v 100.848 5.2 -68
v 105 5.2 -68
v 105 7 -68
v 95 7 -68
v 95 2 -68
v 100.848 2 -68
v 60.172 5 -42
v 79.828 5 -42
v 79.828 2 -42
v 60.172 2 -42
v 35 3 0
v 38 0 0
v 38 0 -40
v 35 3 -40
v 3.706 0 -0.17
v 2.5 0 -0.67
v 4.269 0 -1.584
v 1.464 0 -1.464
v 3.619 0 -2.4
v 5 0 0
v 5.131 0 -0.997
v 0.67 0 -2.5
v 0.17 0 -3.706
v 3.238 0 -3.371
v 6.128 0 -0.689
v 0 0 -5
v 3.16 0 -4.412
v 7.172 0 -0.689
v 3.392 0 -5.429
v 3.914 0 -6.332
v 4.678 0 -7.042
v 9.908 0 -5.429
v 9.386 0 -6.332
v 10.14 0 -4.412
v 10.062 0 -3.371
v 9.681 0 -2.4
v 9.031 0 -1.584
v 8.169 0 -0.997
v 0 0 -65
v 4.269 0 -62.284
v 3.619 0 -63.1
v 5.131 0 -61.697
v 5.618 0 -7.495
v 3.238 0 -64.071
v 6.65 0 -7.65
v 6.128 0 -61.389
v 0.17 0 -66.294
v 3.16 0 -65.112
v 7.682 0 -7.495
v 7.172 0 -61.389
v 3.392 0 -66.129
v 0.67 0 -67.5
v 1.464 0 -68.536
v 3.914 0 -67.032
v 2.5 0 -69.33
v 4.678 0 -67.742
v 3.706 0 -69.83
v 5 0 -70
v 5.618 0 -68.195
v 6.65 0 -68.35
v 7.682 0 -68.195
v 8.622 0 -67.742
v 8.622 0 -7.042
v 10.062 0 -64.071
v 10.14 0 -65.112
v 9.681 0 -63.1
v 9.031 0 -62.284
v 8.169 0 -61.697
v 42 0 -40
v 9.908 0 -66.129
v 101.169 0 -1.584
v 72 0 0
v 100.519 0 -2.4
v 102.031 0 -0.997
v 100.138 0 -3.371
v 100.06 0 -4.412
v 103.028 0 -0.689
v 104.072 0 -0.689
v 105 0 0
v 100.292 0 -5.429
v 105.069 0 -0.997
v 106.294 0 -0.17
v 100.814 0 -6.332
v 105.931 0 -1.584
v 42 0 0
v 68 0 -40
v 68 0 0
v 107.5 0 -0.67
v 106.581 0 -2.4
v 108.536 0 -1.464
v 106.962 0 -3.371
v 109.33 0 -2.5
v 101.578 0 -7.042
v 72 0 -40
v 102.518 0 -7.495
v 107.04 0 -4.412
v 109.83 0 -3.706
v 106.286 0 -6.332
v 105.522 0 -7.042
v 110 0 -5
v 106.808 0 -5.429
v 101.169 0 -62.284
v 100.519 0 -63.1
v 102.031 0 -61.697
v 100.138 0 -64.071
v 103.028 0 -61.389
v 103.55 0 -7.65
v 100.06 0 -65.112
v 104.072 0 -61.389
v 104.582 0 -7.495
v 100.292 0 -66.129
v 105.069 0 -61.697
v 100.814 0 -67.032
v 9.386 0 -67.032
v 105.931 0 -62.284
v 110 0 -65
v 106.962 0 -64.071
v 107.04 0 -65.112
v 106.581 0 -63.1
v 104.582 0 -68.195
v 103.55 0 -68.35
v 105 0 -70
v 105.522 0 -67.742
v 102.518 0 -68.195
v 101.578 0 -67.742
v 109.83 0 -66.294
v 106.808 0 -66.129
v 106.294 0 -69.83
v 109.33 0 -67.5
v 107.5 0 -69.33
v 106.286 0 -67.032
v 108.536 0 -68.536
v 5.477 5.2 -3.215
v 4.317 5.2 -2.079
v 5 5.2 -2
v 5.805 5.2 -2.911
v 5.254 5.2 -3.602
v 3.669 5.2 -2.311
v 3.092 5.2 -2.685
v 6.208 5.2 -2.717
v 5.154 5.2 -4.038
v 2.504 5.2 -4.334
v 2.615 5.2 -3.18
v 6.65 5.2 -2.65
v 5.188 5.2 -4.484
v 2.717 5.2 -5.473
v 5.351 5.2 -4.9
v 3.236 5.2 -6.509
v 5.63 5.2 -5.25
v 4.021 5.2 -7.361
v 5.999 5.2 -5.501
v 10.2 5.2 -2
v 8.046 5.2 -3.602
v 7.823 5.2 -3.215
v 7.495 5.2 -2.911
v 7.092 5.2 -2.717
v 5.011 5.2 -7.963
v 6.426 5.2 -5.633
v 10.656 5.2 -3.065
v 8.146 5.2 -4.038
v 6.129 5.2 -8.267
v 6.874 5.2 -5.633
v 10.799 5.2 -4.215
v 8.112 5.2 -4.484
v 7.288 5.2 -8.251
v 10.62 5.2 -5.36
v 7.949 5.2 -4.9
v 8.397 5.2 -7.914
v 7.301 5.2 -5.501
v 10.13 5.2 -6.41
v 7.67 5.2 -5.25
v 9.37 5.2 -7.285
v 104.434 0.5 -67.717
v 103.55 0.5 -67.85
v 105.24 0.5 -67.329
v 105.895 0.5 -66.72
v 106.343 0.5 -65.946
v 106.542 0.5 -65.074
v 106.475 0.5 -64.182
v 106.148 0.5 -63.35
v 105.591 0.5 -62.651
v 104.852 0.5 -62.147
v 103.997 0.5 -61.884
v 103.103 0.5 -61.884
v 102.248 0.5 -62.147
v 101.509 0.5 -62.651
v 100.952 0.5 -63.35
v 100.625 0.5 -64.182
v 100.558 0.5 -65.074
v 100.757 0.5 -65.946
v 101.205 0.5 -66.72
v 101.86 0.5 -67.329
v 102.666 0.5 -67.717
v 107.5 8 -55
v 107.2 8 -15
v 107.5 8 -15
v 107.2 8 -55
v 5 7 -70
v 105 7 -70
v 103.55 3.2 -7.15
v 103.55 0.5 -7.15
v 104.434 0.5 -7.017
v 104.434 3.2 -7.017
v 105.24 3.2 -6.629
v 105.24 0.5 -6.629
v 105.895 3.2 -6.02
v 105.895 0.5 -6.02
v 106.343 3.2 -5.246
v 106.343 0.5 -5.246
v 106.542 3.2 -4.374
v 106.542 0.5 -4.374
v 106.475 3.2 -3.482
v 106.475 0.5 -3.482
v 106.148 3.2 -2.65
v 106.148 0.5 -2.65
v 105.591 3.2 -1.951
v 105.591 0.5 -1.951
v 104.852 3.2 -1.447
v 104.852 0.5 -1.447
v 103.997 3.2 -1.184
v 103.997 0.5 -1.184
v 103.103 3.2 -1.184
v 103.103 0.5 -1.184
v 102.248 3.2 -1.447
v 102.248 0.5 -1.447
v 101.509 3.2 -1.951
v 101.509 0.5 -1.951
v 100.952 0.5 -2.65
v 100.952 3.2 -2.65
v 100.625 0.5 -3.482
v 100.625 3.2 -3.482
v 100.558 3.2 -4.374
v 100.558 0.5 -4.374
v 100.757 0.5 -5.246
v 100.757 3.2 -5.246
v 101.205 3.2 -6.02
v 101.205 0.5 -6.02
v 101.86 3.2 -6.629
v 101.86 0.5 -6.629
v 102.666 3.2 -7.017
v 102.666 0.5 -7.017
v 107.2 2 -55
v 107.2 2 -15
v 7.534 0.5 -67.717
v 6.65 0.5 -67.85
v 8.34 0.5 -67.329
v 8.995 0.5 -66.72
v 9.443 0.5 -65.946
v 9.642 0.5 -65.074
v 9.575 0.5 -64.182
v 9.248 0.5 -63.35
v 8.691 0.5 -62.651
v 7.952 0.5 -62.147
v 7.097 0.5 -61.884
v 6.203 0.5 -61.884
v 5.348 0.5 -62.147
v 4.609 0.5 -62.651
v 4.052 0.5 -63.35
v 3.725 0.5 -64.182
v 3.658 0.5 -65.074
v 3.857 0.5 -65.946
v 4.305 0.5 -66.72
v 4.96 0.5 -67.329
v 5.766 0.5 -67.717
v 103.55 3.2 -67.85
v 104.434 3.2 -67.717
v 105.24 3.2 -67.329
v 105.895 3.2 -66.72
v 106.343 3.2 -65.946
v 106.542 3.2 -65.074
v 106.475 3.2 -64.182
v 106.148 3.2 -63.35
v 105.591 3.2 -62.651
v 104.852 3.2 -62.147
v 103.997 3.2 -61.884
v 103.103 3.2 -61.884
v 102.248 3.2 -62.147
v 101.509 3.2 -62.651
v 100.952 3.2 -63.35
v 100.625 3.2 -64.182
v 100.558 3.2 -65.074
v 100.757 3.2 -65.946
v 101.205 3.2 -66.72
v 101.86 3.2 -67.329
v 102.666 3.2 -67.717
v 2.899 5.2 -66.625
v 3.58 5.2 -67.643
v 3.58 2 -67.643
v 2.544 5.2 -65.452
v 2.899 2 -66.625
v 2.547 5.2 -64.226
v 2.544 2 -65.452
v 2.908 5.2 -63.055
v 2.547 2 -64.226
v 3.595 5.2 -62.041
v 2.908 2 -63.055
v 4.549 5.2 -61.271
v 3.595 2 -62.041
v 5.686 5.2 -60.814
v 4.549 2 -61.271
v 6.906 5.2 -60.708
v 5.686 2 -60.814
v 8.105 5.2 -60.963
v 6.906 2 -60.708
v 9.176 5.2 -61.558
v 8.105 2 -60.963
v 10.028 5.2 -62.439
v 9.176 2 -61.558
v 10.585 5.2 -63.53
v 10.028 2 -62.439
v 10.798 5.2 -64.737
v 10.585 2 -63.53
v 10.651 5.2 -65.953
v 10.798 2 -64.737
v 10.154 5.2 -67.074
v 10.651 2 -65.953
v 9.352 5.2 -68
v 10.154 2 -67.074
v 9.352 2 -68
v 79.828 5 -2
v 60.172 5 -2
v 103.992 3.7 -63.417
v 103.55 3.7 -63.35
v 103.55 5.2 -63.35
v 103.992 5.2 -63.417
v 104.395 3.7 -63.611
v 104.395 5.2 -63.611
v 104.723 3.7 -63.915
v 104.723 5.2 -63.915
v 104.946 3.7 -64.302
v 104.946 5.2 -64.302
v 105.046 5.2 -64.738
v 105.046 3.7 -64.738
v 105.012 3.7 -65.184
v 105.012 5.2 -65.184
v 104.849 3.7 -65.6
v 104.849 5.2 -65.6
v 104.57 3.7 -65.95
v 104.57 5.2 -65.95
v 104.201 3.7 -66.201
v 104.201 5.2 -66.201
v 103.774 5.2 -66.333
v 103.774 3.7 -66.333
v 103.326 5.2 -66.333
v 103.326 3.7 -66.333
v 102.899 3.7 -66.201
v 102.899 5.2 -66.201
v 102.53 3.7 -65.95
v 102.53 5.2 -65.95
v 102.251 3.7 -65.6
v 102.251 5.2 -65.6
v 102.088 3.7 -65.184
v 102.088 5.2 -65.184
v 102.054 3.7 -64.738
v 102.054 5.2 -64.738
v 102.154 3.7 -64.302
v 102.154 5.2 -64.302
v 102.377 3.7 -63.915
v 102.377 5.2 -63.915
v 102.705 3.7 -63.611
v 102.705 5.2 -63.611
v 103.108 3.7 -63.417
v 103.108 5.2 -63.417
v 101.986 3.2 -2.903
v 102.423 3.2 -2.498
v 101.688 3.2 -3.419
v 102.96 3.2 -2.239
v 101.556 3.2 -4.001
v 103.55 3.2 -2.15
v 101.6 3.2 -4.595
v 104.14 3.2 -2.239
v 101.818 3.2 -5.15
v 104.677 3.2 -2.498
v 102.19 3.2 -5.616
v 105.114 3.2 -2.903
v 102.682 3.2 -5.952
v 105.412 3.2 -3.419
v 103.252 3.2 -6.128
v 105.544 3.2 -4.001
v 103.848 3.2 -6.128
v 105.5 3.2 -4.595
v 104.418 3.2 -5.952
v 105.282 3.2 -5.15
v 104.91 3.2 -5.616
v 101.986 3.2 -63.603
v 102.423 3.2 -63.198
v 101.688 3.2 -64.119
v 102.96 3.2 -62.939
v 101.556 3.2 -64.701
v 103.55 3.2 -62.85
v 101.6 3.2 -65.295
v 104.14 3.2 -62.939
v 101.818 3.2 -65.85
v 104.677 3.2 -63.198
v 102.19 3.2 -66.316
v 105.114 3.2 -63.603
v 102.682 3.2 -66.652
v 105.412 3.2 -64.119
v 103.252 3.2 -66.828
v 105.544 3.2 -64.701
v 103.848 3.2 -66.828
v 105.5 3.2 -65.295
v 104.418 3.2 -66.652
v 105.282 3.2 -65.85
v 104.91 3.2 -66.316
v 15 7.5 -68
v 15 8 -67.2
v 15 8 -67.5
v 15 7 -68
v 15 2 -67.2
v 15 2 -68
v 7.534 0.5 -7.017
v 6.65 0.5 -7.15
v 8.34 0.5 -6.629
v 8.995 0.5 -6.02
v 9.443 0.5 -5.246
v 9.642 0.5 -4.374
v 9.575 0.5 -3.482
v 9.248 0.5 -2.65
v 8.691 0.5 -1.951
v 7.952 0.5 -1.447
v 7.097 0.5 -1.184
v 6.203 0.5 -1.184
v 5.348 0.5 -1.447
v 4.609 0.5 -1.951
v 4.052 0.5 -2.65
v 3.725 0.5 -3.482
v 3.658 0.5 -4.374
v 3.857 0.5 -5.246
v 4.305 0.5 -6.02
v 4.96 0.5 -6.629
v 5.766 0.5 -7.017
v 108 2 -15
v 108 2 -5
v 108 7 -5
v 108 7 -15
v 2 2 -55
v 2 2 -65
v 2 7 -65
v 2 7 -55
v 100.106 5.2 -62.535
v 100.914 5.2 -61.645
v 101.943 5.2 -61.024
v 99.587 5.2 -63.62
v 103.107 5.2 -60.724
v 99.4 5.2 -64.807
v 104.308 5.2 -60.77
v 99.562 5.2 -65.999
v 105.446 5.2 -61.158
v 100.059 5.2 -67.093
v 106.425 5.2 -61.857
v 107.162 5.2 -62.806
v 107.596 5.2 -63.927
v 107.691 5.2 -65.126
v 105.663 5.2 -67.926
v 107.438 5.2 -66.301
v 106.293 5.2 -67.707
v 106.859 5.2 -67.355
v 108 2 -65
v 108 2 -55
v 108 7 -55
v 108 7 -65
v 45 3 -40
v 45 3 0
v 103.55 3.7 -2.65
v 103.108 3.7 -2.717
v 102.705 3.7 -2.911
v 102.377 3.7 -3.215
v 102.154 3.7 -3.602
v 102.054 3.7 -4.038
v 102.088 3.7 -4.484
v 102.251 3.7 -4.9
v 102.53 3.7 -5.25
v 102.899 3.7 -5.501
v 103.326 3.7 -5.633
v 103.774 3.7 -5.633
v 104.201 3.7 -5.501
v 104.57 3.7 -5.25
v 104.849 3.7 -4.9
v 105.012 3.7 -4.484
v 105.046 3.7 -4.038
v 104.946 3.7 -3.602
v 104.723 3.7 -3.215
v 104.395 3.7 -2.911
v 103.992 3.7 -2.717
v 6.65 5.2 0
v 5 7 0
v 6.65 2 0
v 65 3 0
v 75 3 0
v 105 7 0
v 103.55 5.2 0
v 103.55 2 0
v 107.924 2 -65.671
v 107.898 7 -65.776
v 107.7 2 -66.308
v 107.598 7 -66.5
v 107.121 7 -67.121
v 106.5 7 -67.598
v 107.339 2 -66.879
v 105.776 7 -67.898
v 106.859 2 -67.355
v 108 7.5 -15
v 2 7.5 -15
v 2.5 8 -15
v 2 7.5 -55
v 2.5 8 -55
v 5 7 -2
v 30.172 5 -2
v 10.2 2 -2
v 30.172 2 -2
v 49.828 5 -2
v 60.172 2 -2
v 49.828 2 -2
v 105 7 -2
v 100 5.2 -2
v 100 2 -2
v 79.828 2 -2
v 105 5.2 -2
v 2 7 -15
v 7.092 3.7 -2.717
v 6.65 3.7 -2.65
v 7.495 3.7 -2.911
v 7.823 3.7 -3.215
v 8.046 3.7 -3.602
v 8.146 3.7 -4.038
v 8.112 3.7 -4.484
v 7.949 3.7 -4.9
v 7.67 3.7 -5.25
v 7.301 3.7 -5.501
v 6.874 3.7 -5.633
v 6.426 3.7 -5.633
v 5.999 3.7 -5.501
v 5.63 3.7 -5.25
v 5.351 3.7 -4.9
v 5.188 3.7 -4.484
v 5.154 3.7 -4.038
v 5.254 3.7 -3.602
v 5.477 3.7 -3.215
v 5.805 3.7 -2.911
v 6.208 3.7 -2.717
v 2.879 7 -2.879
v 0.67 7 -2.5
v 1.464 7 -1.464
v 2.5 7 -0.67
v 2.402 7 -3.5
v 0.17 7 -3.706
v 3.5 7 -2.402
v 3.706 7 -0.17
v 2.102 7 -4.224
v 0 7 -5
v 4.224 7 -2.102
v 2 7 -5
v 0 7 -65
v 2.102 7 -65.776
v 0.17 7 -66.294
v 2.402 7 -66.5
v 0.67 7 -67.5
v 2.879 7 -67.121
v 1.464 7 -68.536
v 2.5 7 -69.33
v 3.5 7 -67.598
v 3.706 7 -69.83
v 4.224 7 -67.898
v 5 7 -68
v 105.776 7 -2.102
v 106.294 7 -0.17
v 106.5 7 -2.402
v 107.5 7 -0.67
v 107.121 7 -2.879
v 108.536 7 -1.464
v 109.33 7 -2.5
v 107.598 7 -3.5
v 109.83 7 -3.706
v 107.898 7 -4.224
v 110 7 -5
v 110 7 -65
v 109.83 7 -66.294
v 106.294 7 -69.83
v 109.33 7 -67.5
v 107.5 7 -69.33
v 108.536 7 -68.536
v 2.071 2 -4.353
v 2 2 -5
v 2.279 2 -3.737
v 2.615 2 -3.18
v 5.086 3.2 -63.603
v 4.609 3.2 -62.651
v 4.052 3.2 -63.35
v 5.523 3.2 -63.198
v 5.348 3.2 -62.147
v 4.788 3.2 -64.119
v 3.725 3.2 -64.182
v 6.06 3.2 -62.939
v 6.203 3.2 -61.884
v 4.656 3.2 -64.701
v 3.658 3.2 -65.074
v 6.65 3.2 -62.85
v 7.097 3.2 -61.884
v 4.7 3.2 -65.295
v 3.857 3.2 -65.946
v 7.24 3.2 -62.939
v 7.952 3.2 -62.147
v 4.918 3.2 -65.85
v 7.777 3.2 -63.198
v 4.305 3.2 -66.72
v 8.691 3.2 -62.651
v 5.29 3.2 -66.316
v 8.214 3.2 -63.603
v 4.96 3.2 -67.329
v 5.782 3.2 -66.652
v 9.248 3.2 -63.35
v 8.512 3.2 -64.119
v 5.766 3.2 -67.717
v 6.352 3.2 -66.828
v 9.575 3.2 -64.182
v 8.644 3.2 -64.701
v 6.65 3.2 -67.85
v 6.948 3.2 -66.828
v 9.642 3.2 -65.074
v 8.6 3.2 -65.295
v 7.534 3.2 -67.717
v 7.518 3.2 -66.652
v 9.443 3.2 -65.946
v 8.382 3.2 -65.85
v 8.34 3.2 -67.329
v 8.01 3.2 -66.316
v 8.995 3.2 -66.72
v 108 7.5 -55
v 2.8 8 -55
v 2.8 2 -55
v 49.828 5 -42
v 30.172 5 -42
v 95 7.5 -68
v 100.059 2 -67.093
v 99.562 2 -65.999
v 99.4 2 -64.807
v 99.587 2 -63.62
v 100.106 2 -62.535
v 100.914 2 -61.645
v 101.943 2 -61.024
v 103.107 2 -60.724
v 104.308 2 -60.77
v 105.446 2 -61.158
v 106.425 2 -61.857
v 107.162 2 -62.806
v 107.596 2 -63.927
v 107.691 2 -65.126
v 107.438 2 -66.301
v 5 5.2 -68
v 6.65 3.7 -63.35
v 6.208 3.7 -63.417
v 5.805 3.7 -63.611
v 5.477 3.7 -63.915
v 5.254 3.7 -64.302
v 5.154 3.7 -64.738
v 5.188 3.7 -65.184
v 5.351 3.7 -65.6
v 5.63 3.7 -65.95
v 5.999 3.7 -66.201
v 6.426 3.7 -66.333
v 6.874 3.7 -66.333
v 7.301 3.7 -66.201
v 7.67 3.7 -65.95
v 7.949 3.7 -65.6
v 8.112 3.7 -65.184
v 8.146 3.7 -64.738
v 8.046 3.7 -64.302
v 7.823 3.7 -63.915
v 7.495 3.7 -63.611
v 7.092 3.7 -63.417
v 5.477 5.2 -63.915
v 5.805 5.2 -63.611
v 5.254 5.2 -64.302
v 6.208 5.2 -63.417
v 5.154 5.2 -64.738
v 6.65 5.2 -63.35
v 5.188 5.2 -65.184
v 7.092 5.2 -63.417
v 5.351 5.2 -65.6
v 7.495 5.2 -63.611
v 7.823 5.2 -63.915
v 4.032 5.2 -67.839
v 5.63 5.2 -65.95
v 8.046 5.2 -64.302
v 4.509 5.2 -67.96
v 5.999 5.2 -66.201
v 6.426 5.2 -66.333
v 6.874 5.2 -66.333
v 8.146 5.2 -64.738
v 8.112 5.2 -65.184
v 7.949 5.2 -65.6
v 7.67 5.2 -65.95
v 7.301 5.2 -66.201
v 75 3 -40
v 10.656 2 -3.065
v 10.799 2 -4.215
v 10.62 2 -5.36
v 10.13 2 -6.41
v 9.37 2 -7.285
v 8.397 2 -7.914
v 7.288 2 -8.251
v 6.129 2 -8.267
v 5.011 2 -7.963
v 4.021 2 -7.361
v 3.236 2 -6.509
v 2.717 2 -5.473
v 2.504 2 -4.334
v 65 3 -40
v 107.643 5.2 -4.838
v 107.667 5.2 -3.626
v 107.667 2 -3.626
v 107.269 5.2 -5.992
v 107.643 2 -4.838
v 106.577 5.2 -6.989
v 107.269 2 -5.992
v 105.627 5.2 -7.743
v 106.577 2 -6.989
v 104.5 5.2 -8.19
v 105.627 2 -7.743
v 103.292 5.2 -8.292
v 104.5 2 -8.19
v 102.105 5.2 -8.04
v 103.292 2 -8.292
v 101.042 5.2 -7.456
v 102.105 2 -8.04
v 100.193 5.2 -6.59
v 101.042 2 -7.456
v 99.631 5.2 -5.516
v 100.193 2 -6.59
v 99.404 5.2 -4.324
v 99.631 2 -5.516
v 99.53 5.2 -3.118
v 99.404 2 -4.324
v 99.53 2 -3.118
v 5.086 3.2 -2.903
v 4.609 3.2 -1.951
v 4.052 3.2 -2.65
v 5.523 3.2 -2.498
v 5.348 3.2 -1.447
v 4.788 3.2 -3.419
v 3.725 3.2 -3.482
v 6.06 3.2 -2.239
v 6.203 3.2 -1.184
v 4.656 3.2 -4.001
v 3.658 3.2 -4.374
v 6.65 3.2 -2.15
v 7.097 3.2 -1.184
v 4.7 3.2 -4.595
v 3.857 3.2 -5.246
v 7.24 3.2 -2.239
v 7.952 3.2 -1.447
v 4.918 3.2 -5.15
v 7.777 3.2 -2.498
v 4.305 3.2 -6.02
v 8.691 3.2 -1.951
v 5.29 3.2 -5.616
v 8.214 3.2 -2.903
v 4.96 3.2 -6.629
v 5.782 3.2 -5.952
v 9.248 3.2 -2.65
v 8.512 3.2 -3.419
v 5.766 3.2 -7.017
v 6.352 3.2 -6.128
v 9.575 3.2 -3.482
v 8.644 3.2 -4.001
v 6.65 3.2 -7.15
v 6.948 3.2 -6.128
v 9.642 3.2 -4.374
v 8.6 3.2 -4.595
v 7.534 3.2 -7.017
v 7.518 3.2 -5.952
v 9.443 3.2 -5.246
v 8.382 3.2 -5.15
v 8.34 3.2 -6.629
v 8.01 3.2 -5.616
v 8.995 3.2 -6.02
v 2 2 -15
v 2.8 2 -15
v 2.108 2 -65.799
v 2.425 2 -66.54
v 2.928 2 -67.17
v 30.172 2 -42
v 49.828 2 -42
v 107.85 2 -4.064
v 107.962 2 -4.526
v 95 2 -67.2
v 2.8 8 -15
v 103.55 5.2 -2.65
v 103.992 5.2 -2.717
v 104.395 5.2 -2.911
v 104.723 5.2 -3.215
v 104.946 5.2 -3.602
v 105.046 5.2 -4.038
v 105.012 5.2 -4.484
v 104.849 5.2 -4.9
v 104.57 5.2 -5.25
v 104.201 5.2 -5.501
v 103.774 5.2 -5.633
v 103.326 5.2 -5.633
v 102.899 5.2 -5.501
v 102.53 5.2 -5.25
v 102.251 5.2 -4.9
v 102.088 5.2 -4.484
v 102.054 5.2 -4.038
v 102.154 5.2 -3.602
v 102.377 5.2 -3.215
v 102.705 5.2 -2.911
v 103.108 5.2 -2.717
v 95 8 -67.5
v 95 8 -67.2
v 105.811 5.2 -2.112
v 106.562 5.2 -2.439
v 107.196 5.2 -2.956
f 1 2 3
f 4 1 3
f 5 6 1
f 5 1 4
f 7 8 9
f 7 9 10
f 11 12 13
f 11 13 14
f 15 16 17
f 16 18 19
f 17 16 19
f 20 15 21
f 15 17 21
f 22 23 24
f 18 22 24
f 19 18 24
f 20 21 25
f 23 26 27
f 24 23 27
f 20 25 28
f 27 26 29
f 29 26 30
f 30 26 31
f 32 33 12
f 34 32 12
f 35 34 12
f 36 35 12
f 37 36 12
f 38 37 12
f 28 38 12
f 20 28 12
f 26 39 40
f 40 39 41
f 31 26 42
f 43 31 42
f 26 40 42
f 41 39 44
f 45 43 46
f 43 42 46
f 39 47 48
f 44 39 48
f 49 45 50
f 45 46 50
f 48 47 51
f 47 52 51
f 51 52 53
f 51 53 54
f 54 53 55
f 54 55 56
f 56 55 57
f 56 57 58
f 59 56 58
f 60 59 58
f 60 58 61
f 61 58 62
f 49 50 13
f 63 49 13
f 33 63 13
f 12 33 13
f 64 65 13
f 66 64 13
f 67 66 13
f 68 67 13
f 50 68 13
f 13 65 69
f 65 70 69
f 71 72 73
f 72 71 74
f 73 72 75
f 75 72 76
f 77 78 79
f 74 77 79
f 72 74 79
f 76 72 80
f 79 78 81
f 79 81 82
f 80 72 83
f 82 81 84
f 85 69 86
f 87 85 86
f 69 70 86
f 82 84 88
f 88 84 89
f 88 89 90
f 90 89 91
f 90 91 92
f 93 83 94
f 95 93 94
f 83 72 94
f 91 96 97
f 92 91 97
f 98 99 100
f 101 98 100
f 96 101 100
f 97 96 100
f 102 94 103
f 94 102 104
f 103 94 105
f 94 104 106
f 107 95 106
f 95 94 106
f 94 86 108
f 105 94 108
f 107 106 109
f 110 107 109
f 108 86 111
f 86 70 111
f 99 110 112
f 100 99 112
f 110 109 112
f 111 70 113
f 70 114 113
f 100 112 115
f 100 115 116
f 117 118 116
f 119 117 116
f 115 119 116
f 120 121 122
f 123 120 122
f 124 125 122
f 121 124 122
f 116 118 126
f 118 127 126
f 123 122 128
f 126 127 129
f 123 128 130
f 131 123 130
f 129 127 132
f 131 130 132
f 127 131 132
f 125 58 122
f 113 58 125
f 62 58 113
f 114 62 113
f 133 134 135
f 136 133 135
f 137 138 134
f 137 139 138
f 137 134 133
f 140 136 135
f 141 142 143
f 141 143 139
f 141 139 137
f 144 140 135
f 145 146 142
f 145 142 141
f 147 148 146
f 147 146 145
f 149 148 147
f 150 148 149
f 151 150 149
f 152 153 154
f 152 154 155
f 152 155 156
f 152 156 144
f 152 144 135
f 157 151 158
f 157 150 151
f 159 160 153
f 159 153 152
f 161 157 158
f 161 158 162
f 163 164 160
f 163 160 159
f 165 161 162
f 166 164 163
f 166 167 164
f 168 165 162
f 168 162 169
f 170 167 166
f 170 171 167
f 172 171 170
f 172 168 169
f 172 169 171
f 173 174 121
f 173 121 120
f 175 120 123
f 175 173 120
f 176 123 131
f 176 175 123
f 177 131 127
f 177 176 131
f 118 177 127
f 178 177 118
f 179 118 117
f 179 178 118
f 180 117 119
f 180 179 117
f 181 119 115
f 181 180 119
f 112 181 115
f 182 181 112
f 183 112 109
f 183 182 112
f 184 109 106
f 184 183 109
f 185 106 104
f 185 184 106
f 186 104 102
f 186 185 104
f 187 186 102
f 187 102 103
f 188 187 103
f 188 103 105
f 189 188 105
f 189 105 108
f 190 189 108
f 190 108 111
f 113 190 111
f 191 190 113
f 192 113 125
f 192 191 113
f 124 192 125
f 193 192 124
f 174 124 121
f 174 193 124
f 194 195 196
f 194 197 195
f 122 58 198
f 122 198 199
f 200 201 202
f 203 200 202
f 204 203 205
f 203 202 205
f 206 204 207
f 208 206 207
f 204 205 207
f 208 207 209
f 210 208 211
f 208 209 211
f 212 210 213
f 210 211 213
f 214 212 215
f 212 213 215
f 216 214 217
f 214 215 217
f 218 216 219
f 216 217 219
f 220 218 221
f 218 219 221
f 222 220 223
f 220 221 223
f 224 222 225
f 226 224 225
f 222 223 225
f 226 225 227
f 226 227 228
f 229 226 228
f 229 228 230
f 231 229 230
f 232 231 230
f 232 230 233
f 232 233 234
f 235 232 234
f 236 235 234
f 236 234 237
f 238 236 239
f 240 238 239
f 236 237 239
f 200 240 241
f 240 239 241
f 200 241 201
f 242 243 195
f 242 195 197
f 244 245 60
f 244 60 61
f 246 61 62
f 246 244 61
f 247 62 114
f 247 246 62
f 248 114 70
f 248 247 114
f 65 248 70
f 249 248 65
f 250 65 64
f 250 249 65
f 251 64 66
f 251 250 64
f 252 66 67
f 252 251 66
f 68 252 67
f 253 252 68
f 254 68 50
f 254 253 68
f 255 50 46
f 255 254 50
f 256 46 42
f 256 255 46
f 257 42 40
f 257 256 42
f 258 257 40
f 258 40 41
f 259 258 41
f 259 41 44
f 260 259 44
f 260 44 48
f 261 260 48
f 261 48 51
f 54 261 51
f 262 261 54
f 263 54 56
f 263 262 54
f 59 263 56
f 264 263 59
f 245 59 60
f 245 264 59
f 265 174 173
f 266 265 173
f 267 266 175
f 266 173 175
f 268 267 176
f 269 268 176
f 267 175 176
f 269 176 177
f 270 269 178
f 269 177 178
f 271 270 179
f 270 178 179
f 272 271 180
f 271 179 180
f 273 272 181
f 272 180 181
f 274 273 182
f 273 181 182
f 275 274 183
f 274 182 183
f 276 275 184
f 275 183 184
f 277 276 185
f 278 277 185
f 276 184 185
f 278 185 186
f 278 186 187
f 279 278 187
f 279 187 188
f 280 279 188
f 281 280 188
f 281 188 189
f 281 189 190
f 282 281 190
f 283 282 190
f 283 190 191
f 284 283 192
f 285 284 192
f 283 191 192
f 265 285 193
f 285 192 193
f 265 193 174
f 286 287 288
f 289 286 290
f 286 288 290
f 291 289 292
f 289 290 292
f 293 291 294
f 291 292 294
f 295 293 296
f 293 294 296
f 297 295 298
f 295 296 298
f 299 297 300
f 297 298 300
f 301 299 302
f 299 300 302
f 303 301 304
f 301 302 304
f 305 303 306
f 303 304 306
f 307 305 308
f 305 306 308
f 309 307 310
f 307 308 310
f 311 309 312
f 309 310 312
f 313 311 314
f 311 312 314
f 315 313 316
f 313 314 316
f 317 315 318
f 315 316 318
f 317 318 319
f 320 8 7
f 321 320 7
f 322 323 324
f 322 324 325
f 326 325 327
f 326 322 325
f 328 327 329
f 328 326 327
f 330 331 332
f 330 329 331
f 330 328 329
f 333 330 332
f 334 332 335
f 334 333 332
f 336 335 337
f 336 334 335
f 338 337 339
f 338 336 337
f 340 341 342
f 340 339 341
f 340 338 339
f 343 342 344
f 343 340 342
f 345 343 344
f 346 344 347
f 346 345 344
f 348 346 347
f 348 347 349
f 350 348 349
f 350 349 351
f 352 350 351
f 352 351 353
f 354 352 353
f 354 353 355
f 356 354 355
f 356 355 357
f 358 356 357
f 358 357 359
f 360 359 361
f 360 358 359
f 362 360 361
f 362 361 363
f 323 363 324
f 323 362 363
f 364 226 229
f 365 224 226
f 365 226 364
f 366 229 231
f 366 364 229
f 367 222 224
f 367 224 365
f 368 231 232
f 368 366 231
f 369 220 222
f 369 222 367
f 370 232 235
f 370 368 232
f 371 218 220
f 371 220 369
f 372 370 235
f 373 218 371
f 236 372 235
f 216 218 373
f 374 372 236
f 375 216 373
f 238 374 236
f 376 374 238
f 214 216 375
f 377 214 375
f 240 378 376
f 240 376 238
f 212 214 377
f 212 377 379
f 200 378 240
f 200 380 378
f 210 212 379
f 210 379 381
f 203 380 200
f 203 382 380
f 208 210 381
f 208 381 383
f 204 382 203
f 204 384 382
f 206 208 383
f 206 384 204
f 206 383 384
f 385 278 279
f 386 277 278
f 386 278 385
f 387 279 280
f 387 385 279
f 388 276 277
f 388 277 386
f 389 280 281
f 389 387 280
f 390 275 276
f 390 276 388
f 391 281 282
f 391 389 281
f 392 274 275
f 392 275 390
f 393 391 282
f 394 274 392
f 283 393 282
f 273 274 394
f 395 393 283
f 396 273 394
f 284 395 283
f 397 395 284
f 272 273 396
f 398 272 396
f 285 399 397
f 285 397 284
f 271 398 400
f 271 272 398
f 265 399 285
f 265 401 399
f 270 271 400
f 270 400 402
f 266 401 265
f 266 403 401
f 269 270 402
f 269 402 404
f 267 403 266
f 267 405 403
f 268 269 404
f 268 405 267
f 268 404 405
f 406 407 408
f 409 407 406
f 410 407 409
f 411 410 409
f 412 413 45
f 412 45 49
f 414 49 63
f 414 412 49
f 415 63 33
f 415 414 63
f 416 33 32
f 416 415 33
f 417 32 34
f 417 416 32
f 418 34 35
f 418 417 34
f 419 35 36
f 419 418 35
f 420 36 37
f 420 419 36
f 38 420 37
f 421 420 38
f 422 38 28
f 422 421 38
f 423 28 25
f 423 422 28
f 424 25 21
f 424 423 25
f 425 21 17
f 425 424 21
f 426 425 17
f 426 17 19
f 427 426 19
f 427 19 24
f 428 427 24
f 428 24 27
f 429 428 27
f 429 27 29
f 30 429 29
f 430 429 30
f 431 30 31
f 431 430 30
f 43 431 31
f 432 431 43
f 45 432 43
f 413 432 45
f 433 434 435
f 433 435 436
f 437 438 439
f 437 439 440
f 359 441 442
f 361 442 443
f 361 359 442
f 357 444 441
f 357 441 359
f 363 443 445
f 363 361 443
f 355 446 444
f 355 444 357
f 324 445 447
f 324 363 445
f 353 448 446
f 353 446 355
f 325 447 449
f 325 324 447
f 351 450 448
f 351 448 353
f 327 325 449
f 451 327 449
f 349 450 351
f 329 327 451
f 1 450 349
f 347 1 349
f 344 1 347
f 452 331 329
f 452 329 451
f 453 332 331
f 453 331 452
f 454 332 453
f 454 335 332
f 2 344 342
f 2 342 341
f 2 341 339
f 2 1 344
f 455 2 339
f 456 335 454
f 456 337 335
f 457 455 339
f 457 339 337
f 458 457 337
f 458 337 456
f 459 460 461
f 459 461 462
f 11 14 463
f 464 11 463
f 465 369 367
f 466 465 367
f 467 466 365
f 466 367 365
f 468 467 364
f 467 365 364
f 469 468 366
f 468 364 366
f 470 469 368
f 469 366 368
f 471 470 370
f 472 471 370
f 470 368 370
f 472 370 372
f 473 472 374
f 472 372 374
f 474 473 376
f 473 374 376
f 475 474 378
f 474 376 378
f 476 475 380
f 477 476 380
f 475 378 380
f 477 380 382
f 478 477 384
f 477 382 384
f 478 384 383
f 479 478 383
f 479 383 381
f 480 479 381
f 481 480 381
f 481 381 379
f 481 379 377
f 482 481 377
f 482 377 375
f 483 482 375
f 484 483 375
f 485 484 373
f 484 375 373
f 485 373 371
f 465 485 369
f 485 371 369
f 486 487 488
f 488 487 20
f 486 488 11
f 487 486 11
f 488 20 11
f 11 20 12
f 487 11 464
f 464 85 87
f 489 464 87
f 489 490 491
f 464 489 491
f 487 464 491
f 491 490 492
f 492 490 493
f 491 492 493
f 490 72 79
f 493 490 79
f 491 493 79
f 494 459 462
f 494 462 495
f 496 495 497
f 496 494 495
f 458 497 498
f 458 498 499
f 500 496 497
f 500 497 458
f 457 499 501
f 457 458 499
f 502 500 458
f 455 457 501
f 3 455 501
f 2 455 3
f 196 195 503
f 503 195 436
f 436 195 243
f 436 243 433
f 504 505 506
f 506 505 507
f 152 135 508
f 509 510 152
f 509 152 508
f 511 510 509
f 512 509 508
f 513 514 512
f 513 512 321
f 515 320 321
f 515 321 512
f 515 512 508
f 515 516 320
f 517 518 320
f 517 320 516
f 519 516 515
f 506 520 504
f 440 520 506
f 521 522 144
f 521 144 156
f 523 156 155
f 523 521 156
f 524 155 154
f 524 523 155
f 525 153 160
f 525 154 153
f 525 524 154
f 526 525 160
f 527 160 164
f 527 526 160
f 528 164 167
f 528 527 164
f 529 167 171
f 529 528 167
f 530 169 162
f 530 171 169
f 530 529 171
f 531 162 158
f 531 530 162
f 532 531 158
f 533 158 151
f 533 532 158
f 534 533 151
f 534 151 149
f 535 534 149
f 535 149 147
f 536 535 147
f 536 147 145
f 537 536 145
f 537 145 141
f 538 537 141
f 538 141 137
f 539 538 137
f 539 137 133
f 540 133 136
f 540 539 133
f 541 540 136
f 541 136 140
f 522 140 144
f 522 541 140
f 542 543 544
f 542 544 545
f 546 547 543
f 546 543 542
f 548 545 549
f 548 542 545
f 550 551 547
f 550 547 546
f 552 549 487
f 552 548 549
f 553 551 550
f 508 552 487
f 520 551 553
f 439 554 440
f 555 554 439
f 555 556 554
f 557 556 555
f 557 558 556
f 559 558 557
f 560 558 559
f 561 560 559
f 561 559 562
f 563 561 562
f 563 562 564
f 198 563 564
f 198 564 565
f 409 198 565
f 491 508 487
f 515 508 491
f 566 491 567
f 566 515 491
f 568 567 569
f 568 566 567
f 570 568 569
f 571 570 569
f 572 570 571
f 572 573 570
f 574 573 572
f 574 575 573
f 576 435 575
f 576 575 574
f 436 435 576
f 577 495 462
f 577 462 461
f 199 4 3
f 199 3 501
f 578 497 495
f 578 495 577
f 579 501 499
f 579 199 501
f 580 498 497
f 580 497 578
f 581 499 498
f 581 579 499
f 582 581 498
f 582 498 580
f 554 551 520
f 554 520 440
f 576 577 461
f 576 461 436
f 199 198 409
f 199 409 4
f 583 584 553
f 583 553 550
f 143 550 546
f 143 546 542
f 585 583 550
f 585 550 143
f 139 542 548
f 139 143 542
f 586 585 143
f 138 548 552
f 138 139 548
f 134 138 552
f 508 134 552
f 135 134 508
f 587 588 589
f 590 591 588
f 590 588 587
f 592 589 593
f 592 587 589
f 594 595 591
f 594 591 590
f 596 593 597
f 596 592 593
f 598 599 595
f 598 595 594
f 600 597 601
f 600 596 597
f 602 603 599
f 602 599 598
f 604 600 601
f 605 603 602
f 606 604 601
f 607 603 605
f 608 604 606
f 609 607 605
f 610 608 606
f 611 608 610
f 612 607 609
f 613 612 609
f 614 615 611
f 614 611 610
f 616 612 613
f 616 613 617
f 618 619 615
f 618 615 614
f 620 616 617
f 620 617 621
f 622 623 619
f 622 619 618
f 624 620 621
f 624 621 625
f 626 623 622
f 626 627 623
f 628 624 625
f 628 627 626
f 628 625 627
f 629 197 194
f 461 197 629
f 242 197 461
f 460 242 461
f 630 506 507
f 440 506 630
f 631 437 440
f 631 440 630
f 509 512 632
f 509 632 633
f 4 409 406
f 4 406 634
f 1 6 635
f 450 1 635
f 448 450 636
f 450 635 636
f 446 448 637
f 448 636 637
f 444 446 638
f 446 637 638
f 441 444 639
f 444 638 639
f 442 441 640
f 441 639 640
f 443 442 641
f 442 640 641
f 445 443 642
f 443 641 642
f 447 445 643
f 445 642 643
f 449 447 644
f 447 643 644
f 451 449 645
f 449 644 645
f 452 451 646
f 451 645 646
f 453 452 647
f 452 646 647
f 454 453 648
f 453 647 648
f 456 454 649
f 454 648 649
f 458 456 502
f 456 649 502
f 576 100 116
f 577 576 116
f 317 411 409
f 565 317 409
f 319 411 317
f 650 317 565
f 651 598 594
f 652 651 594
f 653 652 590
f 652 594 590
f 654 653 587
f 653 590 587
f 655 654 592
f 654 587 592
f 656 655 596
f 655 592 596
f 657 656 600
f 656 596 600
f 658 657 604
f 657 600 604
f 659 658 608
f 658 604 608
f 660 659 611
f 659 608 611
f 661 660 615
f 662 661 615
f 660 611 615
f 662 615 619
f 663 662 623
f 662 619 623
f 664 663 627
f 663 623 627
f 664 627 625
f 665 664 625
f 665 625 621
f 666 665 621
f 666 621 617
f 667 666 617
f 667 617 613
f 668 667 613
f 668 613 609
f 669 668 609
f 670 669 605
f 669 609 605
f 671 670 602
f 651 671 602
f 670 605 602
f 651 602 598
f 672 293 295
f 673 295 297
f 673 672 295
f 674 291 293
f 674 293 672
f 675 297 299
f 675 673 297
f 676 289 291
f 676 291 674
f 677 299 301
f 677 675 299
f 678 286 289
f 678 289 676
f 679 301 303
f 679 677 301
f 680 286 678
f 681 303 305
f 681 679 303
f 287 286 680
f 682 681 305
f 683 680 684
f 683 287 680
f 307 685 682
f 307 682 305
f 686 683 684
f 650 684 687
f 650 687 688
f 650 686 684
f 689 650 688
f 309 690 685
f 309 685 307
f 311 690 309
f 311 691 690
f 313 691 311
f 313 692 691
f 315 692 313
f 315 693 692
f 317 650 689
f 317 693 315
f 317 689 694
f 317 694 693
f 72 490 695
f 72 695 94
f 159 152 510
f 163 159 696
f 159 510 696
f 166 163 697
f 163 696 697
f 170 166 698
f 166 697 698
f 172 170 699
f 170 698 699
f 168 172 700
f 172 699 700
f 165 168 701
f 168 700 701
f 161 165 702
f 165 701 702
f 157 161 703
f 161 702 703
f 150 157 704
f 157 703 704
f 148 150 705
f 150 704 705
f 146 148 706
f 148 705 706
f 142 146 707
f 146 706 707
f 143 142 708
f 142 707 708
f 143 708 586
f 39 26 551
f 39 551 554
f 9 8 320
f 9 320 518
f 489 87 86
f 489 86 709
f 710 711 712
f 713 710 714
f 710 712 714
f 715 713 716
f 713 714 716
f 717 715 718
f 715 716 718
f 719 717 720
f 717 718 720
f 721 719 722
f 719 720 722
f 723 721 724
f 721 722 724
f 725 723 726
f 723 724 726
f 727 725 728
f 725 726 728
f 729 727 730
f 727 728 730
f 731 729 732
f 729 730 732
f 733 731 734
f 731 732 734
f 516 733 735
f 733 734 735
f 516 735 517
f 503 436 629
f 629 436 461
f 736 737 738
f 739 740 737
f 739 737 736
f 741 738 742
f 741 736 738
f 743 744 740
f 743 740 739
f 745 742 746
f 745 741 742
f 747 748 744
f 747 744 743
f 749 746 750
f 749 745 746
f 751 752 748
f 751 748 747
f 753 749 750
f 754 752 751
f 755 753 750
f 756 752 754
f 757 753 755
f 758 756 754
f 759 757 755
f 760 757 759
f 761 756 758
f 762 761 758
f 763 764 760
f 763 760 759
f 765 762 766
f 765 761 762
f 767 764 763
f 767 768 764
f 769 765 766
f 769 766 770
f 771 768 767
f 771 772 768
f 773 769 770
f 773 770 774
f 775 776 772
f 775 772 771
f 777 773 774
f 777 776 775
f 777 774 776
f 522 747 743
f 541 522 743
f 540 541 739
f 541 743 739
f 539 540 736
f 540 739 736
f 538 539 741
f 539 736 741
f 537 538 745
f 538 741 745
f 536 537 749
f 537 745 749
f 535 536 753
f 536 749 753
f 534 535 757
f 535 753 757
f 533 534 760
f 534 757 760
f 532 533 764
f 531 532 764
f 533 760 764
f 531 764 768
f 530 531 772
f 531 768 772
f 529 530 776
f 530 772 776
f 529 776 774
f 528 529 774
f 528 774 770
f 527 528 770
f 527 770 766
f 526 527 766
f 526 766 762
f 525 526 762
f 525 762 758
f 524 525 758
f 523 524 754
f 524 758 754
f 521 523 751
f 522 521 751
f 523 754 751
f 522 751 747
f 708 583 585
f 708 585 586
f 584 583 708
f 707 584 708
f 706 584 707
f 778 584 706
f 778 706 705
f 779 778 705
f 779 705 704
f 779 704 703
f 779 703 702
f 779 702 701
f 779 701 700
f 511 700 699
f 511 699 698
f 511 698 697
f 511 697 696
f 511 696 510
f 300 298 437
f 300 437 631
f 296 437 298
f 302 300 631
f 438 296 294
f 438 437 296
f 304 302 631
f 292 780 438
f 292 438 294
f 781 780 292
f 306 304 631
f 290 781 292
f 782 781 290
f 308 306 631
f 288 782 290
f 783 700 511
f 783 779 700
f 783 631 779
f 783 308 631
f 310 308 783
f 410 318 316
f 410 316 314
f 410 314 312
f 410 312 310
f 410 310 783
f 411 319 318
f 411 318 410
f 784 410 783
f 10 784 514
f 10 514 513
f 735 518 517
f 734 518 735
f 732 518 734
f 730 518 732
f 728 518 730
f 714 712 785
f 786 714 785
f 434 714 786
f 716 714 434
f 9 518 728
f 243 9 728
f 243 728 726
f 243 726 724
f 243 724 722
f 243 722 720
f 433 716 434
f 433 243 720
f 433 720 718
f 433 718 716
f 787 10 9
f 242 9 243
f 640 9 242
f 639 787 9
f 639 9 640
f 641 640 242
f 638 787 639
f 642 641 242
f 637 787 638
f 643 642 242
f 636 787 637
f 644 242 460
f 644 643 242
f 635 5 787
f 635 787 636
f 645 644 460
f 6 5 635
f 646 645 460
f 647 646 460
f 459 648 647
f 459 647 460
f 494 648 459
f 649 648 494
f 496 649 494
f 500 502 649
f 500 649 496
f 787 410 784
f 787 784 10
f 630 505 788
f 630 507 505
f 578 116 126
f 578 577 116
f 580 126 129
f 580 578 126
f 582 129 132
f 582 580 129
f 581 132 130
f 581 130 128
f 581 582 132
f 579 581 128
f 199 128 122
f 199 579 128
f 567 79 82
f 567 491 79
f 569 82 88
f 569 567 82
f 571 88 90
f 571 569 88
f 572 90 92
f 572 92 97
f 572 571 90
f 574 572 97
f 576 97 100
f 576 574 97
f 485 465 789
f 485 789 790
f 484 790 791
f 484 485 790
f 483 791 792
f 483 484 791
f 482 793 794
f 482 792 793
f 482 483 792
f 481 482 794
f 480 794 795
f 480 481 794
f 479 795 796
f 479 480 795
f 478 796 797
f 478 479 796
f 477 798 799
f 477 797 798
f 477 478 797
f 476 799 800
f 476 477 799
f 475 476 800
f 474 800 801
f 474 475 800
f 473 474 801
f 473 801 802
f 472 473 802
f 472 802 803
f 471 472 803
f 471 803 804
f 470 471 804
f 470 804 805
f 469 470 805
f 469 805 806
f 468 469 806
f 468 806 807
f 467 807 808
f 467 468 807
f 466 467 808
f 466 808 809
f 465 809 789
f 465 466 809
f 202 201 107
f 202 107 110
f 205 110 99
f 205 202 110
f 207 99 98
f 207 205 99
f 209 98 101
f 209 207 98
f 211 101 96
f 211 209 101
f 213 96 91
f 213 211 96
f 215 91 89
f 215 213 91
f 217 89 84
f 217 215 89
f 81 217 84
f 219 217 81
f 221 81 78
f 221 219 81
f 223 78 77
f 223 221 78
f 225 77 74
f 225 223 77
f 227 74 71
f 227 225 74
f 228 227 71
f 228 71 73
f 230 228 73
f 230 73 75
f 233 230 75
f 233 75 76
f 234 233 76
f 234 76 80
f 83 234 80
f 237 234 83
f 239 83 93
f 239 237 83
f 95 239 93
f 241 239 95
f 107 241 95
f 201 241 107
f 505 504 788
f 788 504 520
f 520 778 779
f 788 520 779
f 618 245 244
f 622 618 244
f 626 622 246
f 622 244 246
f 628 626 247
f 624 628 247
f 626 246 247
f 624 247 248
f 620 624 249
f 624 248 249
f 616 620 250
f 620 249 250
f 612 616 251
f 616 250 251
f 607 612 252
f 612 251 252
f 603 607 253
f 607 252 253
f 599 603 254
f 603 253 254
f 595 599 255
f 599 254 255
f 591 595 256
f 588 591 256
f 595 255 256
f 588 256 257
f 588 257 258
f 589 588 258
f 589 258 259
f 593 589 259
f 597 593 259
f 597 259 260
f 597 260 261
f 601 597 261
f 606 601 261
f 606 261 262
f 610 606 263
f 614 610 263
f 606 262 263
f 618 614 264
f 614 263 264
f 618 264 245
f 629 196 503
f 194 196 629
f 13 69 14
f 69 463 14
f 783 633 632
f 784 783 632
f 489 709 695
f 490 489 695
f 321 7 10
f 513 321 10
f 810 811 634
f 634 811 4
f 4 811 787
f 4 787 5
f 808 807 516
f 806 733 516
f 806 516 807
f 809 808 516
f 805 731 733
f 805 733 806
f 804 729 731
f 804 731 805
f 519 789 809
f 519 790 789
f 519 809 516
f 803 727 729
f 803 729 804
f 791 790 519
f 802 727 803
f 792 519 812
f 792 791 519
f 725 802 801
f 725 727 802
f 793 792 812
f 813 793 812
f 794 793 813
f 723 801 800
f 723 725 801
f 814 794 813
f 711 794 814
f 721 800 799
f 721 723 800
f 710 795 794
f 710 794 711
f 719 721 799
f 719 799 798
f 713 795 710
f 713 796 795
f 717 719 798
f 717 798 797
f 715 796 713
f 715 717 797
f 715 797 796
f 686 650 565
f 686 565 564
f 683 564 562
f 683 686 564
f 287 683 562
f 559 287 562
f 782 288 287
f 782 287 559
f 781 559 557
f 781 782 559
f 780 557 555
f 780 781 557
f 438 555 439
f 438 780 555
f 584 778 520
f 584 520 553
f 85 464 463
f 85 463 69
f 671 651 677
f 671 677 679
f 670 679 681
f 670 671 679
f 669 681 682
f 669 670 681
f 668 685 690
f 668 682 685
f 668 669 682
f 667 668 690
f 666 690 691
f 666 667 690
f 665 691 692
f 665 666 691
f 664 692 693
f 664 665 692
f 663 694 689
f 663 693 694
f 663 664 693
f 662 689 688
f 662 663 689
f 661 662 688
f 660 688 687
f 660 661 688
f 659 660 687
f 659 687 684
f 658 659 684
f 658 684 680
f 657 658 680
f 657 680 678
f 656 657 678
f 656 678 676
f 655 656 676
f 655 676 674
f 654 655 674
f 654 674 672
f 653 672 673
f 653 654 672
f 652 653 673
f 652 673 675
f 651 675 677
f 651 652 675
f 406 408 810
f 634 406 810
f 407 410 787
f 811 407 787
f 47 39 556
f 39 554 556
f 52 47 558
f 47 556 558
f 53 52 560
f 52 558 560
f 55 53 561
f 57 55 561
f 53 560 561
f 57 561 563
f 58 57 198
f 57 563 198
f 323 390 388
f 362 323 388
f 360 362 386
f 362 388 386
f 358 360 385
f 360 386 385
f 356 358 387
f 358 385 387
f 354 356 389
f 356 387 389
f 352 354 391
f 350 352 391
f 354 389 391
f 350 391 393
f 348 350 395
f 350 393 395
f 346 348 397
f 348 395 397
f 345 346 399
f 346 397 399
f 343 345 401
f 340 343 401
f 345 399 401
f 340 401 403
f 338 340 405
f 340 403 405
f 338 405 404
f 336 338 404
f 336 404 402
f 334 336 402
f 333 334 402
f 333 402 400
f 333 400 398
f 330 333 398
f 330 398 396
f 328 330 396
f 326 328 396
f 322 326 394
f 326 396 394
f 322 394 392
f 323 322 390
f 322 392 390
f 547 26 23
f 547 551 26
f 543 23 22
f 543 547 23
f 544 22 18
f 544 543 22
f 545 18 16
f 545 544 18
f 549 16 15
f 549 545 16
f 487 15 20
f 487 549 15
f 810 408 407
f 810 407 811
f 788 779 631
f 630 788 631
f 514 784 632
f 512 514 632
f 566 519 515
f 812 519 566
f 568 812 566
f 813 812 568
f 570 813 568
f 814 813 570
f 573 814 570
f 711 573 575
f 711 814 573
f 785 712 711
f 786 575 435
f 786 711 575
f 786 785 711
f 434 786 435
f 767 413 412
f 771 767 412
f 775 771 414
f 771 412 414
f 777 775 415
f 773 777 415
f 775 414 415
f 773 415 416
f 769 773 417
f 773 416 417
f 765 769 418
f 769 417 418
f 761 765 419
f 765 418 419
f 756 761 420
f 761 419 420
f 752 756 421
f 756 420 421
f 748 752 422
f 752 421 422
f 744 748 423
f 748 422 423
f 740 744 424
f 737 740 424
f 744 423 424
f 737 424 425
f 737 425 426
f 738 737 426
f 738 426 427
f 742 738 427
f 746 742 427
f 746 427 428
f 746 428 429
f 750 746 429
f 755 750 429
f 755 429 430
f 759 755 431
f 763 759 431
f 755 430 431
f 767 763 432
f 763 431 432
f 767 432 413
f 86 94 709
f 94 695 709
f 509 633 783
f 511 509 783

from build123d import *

# Parameters (mm, degrees)
SKETCH1_W               = 110
SKETCH1_H               = 70
BOSS_EXTRUDE1_DEPTH     = 7
FILLET1_R               = 5
CUT_EXTRUDE1_DEPTH      = 40
SHELL1_START            = 5
SHELL1_DEPTH            = 2
SHELL1_START_2          = 2
SHELL1_2_DEPTH          = 3
SHELL1_START_3          = -42
SHELL1_3_DEPTH          = 40
SHELL1_4_DEPTH          = 2
SKETCH2_W               = 80
SKETCH2_H               = 0.8
SKETCH2_W_2             = 0.8
SKETCH2_H_2             = 40
BOSS_EXTRUDE2_DEPTH     = 6
CHAMFER1_SIZE           = 0.5
SKETCH8_R               = 4.15
BOSS_EXTRUDE3_DEPTH     = 3.2
CUT_EXTRUDE5_DEPTH      = 131.48770057
CUT_EXTRUDE5_DEPTH_BACK = 131.48770057
SKETCH9_R               = 1.5
SKETCH10_R              = 3
CUT_EXTRUDE6_DEPTH      = 3.2
CHAMFER2_SIZE           = 0.5
BOSS_EXTRUDE4_REACH     = 120.017


with BuildPart() as part:
    # Sketch1 → Boss-Extrude1 (new body)
    with BuildSketch(Plane(origin=(0, 0, 0), x_dir=(1, 0, 0), z_dir=(0, 1, 0))):
        with Locations((55, 35)):
            Rectangle(SKETCH1_W, SKETCH1_H)
    extrude(amount=BOSS_EXTRUDE1_DEPTH)

    # Fillet1
    fillet1_edges = [part.edges().sort_by_distance(p)[0] for p in [
        (0, 3.5, -70),
        (110, 3.5, -70),
        (110, 3.5, 0),
        (0, 3.5, 0),
    ]]
    fillet(fillet1_edges, radius=FILLET1_R)

    # Sketch3 → Cut-Extrude1 (cut)
    with BuildSketch(Plane.XY):
        Polygon((38, 0), (35, 3), (45, 3), (42, 0), align=None)
        Polygon((68, 0), (65, 3), (75, 3), (72, 0), align=None)
    extrude(amount=-CUT_EXTRUDE1_DEPTH, mode=Mode.SUBTRACT)

    # Shell1: read off the stored shape, not the designer's step
    # Shell1 outline → Shell1 (cut)
    with BuildSketch(Plane(origin=(0, 0, 0), x_dir=(1, 0, 0), z_dir=(0, 1, 0)).offset(SHELL1_START)):
        with BuildLine():
            Line((2, 65), (2, 5))
            ThreePointArc((2, 5), (2.878679656, 2.878679656), (5, 2))
            Line((5, 2), (105, 2))
            ThreePointArc((105, 2), (107.121320344, 2.878679656), (108, 5))
            Line((108, 5), (108, 65))
            ThreePointArc((108, 65), (107.121320344, 67.121320344), (105, 68))
            Line((105, 68), (5, 68))
            ThreePointArc((5, 68), (2.878679656, 67.121320344), (2, 65))
        make_face()
    extrude(amount=SHELL1_DEPTH, mode=Mode.SUBTRACT)

    # Shell1 2 outline → Shell1 2 (cut)
    with BuildSketch(Plane(origin=(0, 0, 0), x_dir=(1, 0, 0), z_dir=(0, 1, 0)).offset(SHELL1_START_2)):
        with BuildLine():
            Line((2, 65), (2, 5))
            ThreePointArc((2, 5), (2.878679656, 2.878679656), (5, 2))
            Line((5, 2), (105, 2))
            ThreePointArc((105, 2), (107.121320344, 2.878679656), (108, 5))
            Line((108, 5), (108, 65))
            ThreePointArc((108, 65), (107.121320344, 67.121320344), (105, 68))
            Line((105, 68), (5, 68))
            ThreePointArc((5, 68), (2.878679656, 67.121320344), (2, 65))
        make_face()
    extrude(amount=SHELL1_2_DEPTH, mode=Mode.SUBTRACT)

    # Shell1 3 outline → Shell1 3 (add)
    with BuildSketch(Plane.XY.offset(SHELL1_START_3)):
        Polygon((36, 2), (35, 3), (45, 3), (44, 2), (46.828427125, 2), (49.828427125, 5), (30.171572875, 5), (33.171572875, 2), align=None)
        Polygon((60.171572875, 5), (63.171572875, 2), (66, 2), (65, 3), (75, 3), (74, 2), (76.828427125, 2), (79.828427125, 5), align=None)
    extrude(amount=SHELL1_3_DEPTH)

    # Shell1 4 outline → Shell1 4 (add)
    with BuildSketch(Plane.XY.offset(SHELL1_START_3)):
        Polygon((45, 3), (35, 3), (36, 2), (44, 2), align=None)
        Polygon((65, 3), (66, 2), (74, 2), (75, 3), align=None)
    extrude(amount=SHELL1_4_DEPTH)

    # Sketch2 → Boss-Extrude2 (add)
    with BuildSketch(Plane(origin=(0, 2, 0), x_dir=(1, 0, 0), z_dir=(0, 1, 0))):
        with Locations((55, 67.6)):
            Rectangle(SKETCH2_W, SKETCH2_H)
        with Locations((107.6, 35)):
            Rectangle(SKETCH2_W_2, SKETCH2_H_2)
        with Locations((2.4, 35)):
            Rectangle(SKETCH2_W_2, SKETCH2_H_2)
    extrude(amount=BOSS_EXTRUDE2_DEPTH)

    # Chamfer1
    chamfer1_edges = [part.edges().sort_by_distance(p)[0] for p in [
        (55, 8, -68),
        (108, 8, -35),
        (2, 8, -35),
    ]]
    chamfer(chamfer1_edges, length=CHAMFER1_SIZE)

    # Sketch8 → Boss-Extrude3 (add)
    with BuildSketch(Plane(origin=(0, 2, 0), x_dir=(1, 0, 0), z_dir=(0, 1, 0))):
        with Locations((103.55, 64.85)):
            Circle(SKETCH8_R)
        with Locations((6.65, 64.85)):
            Circle(SKETCH8_R)
        with Locations((6.65, 4.15)):
            Circle(SKETCH8_R)
        with Locations((103.55, 4.15)):
            Circle(SKETCH8_R)
    extrude(amount=BOSS_EXTRUDE3_DEPTH)

    # Sketch9 → Cut-Extrude5 (cut, two sides: drawn at the far end of the back side and taken through both)
    with BuildSketch(Plane(origin=(0, 5.2, 0), x_dir=(1, 0, 0), z_dir=(0, 1, 0)).offset(-CUT_EXTRUDE5_DEPTH_BACK)):
        with Locations(Location((6.65, 64.85, 0), (0, 0, 270))):
            Circle(SKETCH9_R)
        with Locations(Location((6.65, 4.15, 0), (0, 0, 270))):
            Circle(SKETCH9_R)
        with Locations(Location((103.55, 4.15, 0), (0, 0, 270))):
            Circle(SKETCH9_R)
        with Locations(Location((103.55, 64.85, 0), (0, 0, 270))):
            Circle(SKETCH9_R)
    extrude(amount=CUT_EXTRUDE5_DEPTH + CUT_EXTRUDE5_DEPTH_BACK, mode=Mode.SUBTRACT)

    # Sketch10 → Cut-Extrude6 (cut)
    with BuildSketch(Plane(origin=(0, 0, 0), x_dir=(-1, 0, 0), z_dir=(0, -1, 0))):
        with Locations(Location((-6.65, 4.15, 0), (0, 0, 90))):
            Circle(SKETCH10_R)
        with Locations(Location((-6.65, 64.85, 0), (0, 0, 90))):
            Circle(SKETCH10_R)
        with Locations(Location((-103.55, 64.85, 0), (0, 0, 90))):
            Circle(SKETCH10_R)
        with Locations(Location((-103.55, 4.15, 0), (0, 0, 90))):
            Circle(SKETCH10_R)
    extrude(amount=-CUT_EXTRUDE6_DEPTH, mode=Mode.SUBTRACT)

    # Chamfer2
    chamfer2_edges = [part.edges().sort_by_distance(p)[0] for p in [
        (6.65, 0, -1.15),
        (6.65, 3.2, -5.65),
        (6.65, 0, -61.85),
        (6.65, 3.2, -66.35),
        (103.55, 0, -61.85),
        (103.55, 3.2, -66.35),
        (103.55, 0, -1.15),
        (103.55, 3.2, -5.65),
    ]]
    chamfer(chamfer2_edges, length=CHAMFER2_SIZE)

    # Sketch11 → Boss-Extrude4 (add, up to next)
    with BuildSketch(Plane(origin=(0, 0, -42), x_dir=(-1, 0, 0), z_dir=(0, 0, -1)), mode=Mode.PRIVATE) as boss_extrude4_sk1:
        Polygon((-60.171572875, 5), (-60.171572875, 2), (-63.171572875, 2), align=None)
    boss_extrude4_tool1 = extrude(boss_extrude4_sk1.sketch, amount=-BOSS_EXTRUDE4_REACH, mode=Mode.PRIVATE) - part.part
    # Sketch11 → Boss-Extrude4 (add, up to next)
    with BuildSketch(Plane(origin=(0, 0, -42), x_dir=(-1, 0, 0), z_dir=(0, 0, -1)), mode=Mode.PRIVATE) as boss_extrude4_sk2:
        Polygon((-49.828427125, 5), (-46.828427125, 2), (-49.828427125, 2), align=None)
    boss_extrude4_tool2 = extrude(boss_extrude4_sk2.sketch, amount=-BOSS_EXTRUDE4_REACH, mode=Mode.PRIVATE) - part.part
    # Sketch11 → Boss-Extrude4 (add, up to next)
    with BuildSketch(Plane(origin=(0, 0, -42), x_dir=(-1, 0, 0), z_dir=(0, 0, -1)), mode=Mode.PRIVATE) as boss_extrude4_sk3:
        Polygon((-33.171572875, 2), (-30.171572875, 5), (-30.171572875, 2), align=None)
    boss_extrude4_tool3 = extrude(boss_extrude4_sk3.sketch, amount=-BOSS_EXTRUDE4_REACH, mode=Mode.PRIVATE) - part.part
    # Sketch11 → Boss-Extrude4 (add, up to next)
    with BuildSketch(Plane(origin=(0, 0, -42), x_dir=(-1, 0, 0), z_dir=(0, 0, -1)), mode=Mode.PRIVATE) as boss_extrude4_sk4:
        Polygon((-79.828427125, 5), (-79.828427125, 2), (-76.828427125, 2), align=None)
    boss_extrude4_tool4 = extrude(boss_extrude4_sk4.sketch, amount=-BOSS_EXTRUDE4_REACH, mode=Mode.PRIVATE) - part.part
    add(boss_extrude4_tool1.solids().sort_by_distance((61.171573, 3, -42))[0])
    add(boss_extrude4_tool2.solids().sort_by_distance((48.828427, 3, -42))[0])
    add(boss_extrude4_tool3.solids().sort_by_distance((31.171573, 3, -42))[0])
    add(boss_extrude4_tool4.solids().sort_by_distance((78.828427, 3, -42))[0])


solid = part.part
